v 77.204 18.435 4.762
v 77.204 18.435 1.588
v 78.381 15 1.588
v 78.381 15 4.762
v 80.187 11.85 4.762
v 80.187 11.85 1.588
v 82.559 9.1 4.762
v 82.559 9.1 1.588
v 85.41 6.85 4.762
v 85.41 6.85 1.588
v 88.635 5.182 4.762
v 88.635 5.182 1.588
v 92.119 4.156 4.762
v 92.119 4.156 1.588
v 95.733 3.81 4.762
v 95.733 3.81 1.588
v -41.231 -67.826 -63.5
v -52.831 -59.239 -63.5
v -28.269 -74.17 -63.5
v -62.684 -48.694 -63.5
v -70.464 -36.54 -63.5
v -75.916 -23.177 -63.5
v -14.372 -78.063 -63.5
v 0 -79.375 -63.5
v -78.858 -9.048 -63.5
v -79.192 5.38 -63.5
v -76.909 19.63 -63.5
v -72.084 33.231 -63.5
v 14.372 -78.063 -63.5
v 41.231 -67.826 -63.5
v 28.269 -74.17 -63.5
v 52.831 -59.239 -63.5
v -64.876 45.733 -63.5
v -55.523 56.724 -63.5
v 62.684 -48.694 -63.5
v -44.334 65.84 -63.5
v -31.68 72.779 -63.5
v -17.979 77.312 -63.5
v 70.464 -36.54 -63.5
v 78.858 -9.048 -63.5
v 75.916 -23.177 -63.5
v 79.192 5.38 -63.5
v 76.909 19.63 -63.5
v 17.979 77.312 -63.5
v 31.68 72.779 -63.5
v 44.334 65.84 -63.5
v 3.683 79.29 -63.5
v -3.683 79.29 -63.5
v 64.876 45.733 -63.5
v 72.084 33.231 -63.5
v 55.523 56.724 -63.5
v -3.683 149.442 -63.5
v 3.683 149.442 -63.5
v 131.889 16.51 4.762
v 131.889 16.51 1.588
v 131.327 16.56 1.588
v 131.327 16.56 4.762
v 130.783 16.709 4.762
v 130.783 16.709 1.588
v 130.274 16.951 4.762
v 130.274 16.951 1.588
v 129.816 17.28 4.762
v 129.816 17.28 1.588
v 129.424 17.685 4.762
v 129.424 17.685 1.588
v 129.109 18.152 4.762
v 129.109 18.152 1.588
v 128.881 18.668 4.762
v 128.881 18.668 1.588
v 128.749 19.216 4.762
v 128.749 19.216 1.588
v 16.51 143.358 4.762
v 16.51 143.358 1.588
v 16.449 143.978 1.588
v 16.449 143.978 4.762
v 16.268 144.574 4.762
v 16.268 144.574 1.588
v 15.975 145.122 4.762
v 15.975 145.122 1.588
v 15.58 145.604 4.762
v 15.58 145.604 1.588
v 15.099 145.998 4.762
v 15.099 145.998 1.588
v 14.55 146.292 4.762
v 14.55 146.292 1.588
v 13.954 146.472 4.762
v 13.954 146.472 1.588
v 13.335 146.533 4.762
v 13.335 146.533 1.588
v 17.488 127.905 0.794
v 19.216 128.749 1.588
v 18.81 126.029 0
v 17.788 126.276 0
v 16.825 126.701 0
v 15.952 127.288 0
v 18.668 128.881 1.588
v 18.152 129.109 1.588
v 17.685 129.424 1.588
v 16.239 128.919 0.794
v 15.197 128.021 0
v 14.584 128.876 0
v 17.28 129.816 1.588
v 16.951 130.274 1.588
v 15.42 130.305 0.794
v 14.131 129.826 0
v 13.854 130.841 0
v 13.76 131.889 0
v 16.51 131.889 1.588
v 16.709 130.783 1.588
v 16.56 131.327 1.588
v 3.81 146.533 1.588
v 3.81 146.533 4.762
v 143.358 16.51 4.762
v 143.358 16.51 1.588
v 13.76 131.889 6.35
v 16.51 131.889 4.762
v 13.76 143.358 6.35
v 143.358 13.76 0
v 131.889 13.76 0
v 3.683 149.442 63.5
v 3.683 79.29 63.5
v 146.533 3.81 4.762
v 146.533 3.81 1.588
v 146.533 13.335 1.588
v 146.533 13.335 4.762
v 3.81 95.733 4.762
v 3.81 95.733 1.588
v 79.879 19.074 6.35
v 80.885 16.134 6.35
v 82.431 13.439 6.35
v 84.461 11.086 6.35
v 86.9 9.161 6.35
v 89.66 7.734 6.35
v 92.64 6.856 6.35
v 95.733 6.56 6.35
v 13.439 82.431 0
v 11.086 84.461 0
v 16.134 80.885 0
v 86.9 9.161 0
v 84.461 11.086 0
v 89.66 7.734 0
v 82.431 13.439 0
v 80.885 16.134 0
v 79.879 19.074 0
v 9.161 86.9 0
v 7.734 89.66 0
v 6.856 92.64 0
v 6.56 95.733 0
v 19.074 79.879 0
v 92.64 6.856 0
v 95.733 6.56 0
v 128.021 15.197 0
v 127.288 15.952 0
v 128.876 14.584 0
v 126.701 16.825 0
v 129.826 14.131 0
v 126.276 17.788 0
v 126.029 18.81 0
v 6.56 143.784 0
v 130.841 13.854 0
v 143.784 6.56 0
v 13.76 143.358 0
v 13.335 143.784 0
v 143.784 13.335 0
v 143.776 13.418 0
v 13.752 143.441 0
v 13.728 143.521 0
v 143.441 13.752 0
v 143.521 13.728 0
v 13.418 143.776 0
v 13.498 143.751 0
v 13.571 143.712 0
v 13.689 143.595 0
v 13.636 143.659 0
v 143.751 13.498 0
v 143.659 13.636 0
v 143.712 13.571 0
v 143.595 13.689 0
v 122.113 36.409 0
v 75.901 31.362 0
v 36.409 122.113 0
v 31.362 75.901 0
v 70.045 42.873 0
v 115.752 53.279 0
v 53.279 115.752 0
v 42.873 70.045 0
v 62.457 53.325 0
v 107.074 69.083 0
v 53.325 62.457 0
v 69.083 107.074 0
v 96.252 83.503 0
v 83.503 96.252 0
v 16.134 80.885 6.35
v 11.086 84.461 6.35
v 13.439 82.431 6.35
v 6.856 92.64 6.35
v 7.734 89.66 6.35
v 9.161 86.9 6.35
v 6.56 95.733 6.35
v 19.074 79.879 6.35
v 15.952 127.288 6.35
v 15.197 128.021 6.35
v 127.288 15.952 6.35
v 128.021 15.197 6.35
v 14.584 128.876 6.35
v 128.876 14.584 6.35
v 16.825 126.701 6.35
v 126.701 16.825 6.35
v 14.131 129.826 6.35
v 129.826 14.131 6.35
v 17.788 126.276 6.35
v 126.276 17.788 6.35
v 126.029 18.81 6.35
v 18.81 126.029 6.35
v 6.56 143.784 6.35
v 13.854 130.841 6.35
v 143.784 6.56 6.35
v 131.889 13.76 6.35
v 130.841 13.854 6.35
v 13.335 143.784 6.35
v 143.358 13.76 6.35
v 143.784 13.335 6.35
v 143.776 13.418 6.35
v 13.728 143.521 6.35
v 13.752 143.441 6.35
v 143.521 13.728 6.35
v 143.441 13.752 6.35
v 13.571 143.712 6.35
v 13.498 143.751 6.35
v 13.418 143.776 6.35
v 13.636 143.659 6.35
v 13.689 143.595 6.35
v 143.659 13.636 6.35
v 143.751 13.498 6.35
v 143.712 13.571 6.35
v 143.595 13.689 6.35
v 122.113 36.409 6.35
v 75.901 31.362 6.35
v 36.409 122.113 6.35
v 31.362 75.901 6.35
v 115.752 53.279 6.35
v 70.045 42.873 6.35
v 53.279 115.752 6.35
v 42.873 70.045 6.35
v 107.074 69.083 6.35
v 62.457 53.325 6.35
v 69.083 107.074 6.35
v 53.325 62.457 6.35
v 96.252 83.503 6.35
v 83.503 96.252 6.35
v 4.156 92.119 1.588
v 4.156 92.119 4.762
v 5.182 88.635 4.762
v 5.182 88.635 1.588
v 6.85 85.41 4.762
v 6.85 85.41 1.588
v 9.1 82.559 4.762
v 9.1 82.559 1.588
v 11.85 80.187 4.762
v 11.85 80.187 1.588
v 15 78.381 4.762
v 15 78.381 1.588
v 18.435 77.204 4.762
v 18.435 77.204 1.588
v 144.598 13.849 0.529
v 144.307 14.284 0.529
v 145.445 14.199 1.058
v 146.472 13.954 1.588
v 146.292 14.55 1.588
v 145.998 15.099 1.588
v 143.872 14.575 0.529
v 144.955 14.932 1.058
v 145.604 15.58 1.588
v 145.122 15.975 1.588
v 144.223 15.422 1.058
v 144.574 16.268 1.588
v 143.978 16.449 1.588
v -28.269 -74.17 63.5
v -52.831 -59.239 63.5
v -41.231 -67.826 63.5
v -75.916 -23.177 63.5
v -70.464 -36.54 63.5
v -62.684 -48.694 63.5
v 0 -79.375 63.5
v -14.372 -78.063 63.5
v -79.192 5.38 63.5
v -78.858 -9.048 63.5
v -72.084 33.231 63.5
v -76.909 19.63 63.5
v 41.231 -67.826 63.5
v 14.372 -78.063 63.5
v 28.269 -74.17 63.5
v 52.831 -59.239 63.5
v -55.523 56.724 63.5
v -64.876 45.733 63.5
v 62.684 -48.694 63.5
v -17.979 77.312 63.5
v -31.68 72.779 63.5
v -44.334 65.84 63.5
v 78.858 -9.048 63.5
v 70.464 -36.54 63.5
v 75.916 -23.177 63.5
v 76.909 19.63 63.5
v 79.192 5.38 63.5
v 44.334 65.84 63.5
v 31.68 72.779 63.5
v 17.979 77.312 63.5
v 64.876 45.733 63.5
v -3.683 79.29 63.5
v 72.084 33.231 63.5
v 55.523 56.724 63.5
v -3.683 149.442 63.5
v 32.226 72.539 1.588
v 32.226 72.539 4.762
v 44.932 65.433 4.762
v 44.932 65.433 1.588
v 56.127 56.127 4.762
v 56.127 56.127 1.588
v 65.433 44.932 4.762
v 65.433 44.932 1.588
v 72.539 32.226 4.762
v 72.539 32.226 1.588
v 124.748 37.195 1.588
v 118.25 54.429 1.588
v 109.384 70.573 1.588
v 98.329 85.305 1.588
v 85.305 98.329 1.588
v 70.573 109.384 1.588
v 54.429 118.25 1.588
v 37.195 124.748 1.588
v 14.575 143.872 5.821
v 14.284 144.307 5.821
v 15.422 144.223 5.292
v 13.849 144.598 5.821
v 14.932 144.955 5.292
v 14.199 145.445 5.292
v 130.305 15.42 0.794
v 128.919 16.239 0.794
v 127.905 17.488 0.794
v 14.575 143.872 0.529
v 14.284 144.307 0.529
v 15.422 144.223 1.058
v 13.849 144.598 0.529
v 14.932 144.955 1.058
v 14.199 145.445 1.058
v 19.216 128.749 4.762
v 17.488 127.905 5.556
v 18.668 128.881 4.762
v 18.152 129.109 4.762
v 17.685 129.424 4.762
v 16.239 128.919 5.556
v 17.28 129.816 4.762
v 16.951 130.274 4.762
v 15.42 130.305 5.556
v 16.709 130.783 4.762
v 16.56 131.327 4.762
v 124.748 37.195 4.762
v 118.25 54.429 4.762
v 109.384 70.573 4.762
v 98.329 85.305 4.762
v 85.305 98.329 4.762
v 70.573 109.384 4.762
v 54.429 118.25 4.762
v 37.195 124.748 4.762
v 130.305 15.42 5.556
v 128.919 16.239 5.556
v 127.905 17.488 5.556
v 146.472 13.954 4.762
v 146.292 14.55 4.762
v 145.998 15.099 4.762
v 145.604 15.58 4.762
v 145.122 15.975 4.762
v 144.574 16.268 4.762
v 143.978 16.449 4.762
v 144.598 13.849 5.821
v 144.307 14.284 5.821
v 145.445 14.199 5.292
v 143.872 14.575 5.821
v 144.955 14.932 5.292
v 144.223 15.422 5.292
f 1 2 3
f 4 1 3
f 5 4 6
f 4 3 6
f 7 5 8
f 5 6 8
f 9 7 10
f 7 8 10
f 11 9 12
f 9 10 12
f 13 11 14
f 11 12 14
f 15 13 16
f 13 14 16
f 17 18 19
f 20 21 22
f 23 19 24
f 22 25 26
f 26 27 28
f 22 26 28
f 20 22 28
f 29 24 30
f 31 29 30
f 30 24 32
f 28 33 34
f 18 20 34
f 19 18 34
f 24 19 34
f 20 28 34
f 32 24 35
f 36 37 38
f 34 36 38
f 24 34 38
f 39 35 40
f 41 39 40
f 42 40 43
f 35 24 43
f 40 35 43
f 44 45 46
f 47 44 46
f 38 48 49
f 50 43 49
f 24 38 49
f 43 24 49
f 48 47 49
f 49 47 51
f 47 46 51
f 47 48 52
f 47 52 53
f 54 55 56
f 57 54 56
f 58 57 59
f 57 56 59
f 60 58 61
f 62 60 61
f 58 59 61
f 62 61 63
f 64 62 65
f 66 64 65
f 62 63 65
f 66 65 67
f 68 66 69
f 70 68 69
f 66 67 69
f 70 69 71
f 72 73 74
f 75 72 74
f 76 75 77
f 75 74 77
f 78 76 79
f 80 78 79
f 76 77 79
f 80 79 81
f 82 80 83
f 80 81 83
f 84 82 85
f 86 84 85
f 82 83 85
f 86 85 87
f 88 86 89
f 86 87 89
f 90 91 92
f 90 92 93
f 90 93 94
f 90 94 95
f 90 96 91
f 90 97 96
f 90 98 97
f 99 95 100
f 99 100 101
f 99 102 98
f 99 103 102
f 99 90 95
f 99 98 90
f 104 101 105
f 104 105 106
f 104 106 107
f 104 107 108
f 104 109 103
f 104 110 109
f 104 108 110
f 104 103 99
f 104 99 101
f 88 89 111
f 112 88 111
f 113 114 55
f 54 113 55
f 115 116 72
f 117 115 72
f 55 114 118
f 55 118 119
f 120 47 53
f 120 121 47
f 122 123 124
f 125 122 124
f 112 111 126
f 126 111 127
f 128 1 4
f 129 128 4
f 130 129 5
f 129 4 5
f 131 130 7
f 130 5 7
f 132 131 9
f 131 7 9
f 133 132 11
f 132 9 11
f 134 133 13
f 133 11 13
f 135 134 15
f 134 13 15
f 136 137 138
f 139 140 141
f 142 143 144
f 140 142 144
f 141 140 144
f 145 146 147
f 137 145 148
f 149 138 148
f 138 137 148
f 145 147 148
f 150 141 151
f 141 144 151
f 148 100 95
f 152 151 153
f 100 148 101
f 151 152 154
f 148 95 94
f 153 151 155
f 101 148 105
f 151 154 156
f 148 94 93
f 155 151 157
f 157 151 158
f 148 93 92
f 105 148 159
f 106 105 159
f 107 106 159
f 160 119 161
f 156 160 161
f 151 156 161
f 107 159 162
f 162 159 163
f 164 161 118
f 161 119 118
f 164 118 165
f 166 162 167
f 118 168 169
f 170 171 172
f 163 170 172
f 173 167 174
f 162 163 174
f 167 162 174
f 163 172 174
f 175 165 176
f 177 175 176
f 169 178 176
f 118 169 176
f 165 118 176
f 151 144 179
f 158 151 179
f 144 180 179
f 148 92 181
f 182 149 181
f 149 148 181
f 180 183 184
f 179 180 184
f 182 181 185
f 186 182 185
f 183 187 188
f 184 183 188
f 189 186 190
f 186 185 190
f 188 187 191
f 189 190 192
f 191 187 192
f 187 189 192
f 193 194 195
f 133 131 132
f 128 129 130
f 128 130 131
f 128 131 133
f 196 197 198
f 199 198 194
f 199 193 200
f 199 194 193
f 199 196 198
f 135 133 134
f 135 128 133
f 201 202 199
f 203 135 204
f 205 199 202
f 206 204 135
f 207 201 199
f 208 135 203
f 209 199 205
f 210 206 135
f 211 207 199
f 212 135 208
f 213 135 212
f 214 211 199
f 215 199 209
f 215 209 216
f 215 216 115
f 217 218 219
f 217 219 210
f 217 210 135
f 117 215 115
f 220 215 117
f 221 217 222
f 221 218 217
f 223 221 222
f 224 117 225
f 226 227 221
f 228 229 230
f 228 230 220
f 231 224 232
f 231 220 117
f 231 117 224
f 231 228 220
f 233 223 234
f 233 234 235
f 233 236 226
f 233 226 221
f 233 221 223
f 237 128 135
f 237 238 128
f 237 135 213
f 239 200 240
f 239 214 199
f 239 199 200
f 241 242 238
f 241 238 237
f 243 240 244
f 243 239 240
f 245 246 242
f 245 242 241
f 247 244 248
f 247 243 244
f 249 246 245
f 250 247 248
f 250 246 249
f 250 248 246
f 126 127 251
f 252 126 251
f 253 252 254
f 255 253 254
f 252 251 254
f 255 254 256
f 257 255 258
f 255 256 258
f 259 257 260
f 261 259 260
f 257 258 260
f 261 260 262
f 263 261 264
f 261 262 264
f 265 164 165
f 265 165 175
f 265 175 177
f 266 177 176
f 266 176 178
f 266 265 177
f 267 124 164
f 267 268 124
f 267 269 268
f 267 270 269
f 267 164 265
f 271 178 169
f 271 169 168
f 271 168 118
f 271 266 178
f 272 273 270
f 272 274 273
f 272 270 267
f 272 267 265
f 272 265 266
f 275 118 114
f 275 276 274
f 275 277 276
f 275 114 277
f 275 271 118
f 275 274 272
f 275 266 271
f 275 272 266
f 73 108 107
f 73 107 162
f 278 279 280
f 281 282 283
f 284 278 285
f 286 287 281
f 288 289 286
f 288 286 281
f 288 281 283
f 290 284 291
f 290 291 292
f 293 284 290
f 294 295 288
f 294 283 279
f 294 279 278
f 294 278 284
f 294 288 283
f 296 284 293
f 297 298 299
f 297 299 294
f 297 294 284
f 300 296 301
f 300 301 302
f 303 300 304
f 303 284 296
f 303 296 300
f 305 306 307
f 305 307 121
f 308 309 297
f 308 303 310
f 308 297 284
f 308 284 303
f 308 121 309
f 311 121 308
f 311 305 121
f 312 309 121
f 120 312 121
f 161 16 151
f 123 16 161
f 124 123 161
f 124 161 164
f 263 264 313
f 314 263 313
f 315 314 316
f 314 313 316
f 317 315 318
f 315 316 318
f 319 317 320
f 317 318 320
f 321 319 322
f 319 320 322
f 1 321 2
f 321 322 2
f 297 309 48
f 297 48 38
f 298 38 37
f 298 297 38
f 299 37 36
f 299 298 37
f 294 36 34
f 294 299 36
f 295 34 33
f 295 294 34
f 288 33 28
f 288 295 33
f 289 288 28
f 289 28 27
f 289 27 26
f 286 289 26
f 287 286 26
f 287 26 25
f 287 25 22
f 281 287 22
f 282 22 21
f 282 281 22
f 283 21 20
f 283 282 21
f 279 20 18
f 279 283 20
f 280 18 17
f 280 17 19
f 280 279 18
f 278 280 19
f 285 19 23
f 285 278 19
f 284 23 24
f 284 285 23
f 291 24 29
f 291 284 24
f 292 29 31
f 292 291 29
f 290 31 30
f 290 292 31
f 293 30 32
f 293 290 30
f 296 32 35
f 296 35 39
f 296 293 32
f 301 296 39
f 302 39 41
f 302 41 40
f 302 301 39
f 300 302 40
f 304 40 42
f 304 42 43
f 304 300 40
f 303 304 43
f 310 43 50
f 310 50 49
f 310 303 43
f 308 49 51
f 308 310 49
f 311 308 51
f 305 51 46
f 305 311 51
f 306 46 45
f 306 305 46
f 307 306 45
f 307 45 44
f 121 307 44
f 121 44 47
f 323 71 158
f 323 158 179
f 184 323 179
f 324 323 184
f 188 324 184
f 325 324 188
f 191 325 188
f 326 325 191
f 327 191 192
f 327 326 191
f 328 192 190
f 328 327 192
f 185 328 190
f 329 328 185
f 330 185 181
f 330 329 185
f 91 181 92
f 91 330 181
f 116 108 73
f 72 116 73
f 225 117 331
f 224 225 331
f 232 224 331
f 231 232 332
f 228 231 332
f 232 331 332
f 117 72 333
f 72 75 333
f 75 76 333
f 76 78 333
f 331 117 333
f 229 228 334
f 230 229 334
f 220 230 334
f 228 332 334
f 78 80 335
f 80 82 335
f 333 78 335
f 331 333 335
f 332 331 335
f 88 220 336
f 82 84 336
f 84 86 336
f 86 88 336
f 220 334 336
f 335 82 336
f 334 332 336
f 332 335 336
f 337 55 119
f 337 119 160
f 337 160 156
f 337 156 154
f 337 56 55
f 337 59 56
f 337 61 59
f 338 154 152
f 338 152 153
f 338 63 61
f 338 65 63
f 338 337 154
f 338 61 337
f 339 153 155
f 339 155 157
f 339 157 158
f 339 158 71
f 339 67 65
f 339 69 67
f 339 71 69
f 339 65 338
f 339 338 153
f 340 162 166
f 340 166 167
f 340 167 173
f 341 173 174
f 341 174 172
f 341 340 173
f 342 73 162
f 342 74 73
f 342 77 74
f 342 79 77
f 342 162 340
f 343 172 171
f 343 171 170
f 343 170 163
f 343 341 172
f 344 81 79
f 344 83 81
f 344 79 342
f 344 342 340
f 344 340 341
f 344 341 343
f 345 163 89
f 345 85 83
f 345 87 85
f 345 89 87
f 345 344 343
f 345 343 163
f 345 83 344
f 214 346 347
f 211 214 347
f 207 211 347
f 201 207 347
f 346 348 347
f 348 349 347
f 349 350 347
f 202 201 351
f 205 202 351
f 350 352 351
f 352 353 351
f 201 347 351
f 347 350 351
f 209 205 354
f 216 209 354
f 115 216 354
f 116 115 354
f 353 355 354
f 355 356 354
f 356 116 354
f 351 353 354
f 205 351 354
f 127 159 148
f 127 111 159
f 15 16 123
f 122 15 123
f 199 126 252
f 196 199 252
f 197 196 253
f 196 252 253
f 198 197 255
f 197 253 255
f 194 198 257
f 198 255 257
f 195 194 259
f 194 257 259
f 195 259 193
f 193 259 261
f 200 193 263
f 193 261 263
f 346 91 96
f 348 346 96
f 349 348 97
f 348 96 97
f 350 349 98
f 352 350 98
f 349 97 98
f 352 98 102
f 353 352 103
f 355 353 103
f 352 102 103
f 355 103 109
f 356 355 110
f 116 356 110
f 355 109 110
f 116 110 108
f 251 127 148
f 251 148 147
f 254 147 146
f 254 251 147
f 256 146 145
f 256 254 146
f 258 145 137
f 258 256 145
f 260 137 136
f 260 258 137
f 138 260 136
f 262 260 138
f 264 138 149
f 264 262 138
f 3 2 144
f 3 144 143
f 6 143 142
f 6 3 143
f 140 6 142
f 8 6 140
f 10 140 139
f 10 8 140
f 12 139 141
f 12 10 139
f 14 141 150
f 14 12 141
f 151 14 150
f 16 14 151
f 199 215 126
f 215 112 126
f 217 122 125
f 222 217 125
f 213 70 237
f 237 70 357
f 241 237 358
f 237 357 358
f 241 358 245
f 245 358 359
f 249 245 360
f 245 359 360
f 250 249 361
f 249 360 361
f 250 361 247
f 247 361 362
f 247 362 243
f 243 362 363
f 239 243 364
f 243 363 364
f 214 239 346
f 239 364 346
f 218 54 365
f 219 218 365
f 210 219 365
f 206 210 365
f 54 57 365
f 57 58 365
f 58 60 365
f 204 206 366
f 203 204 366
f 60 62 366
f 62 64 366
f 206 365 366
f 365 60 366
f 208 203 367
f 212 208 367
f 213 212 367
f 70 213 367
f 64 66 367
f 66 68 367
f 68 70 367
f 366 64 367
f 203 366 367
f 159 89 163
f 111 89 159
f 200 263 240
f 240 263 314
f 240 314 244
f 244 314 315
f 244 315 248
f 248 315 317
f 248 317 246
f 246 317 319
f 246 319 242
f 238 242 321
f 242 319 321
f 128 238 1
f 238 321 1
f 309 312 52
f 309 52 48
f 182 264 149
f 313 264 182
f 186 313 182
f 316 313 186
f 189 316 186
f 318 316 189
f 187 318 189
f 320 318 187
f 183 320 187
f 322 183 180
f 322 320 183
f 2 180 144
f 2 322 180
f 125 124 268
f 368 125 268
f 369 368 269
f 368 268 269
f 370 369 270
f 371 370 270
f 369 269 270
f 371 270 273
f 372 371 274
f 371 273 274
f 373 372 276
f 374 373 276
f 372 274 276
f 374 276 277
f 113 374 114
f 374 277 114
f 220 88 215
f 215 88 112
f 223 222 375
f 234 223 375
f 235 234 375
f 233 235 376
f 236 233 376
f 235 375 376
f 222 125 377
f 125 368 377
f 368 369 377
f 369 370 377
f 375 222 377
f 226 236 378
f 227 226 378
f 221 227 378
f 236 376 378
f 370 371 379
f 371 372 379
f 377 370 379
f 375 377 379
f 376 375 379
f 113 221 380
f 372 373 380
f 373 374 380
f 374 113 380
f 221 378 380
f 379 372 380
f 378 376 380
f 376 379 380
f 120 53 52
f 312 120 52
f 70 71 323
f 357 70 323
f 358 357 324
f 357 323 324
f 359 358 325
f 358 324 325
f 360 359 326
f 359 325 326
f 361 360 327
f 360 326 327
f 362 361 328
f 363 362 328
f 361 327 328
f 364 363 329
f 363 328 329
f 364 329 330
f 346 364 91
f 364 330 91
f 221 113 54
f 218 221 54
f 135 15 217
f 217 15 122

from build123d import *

# Parameters (mm, degrees)
BOSS_EXTRUDE1_DEPTH = 6.35
BOSS_EXTRUDE2_DEPTH = 63.5
CHAMFER2_SIZE       = 2.74963128
CHAMFER2_SIZE2      = 1.58750036
CHAMFER3_SIZE       = 2.74963128
CHAMFER3_SIZE2      = 1.58750036


with BuildPart() as part:
    # Sketch1 → Boss-Extrude1 (new body)
    with BuildSketch(Plane.XY):
        with BuildLine():
            ThreePointArc((3.81, 95.733489569), (7.906914495, 83.930619838), (18.435483871, 77.204427072))
            ThreePointArc((18.435483871, 77.204427072), (56.126600757, 56.126600757), (77.204427072, 18.435483871))
            ThreePointArc((77.204427072, 18.435483871), (83.930619838, 7.906914495), (95.733489569, 3.81))
            Line((95.733489569, 3.81), (146.533489569, 3.81))
            Line((146.533489569, 3.81), (146.533489569, 13.335))
            ThreePointArc((146.533489569, 13.335), (145.603553599, 15.58006403), (143.358489569, 16.51))
            Line((143.358489569, 16.51), (131.889056692, 16.51))
            ThreePointArc((131.889056692, 16.51), (129.81631301, 17.279930639), (128.748841056, 19.216309524))
            ThreePointArc((128.748841056, 19.216309524), (92.047625241, 92.047625241), (19.216309524, 128.748841056))
            ThreePointArc((19.216309524, 128.748841056), (17.279930639, 129.81631301), (16.51, 131.889056692))
            Line((16.51, 131.889056692), (16.51, 143.358489569))
            ThreePointArc((16.51, 143.358489569), (15.58006403, 145.603553599), (13.335, 146.533489569))
            Line((13.335, 146.533489569), (3.81, 146.533489569))
            Line((3.81, 146.533489569), (3.81, 95.733489569))
        make_face()
    extrude(amount=BOSS_EXTRUDE1_DEPTH)

    # Chamfer2
    chamfer2_edges = [part.edges().sort_by_distance(p)[0] for p in [
        (8.5725, 146.533489569, 0),
        (15.58006403, 145.603553599, 0),
        (16.51, 137.62377313, 0),
        (17.279930639, 129.81631301, 0),
        (92.047625241, 92.047625241, 0),
        (129.81631301, 17.279930639, 0),
        (137.62377313, 16.51, 0),
        (145.603553599, 15.58006403, 0),
        (146.533489569, 8.5725, 0),
        (121.133489569, 3.81, 0),
        (83.930619838, 7.906914495, 0),
        (56.126600757, 56.126600757, 0),
        (7.906914495, 83.930619838, 0),
        (3.81, 121.133489569, 0),
    ]]
    chamfer2_side = [part.faces().sort_by_distance(p)[0] for p in [
        (69.290156308, 69.290156308, 0),
    ]]
    chamfer(chamfer2_edges, length=CHAMFER2_SIZE, length2=CHAMFER2_SIZE2, reference=chamfer2_side[0])

    # Chamfer3
    chamfer3_edges = [part.edges().sort_by_distance(p)[0] for p in [
        (7.906914495, 83.930619838, 6.35),
        (56.126600757, 56.126600757, 6.35),
        (83.930619838, 7.906914495, 6.35),
        (121.133489569, 3.81, 6.35),
        (146.533489569, 8.5725, 6.35),
        (145.603553599, 15.58006403, 6.35),
        (137.62377313, 16.51, 6.35),
        (129.81631301, 17.279930639, 6.35),
        (92.047625241, 92.047625241, 6.35),
        (17.279930639, 129.81631301, 6.35),
        (3.81, 121.133489569, 6.35),
        (16.51, 137.62377313, 6.35),
        (15.58006403, 145.603553599, 6.35),
        (8.5725, 146.533489569, 6.35),
    ]]
    chamfer3_side = [part.faces().sort_by_distance(p)[0] for p in [
        (69.290156308, 69.290156308, 6.35),
    ]]
    chamfer(chamfer3_edges, length=CHAMFER3_SIZE, length2=CHAMFER3_SIZE2, reference=chamfer3_side[0])


with BuildPart() as body_2:
    # Sketch2 → Boss-Extrude2 (new body, symmetric)
    with BuildSketch(Plane.XY):
        with BuildLine():
            Line((3.683, 149.441811306), (-3.683, 149.441811306))
            Line((-3.683, 149.441811306), (-3.683, 79.28950836))
            ThreePointArc((-3.683, 79.28950836), (0, -79.375), (3.683, 79.28950836))
            Line((3.683, 79.28950836), (3.683, 149.441811306))
        make_face()
    extrude(amount=BOSS_EXTRUDE2_DEPTH, both=True)


solid = Compound([part.part, body_2.part])
